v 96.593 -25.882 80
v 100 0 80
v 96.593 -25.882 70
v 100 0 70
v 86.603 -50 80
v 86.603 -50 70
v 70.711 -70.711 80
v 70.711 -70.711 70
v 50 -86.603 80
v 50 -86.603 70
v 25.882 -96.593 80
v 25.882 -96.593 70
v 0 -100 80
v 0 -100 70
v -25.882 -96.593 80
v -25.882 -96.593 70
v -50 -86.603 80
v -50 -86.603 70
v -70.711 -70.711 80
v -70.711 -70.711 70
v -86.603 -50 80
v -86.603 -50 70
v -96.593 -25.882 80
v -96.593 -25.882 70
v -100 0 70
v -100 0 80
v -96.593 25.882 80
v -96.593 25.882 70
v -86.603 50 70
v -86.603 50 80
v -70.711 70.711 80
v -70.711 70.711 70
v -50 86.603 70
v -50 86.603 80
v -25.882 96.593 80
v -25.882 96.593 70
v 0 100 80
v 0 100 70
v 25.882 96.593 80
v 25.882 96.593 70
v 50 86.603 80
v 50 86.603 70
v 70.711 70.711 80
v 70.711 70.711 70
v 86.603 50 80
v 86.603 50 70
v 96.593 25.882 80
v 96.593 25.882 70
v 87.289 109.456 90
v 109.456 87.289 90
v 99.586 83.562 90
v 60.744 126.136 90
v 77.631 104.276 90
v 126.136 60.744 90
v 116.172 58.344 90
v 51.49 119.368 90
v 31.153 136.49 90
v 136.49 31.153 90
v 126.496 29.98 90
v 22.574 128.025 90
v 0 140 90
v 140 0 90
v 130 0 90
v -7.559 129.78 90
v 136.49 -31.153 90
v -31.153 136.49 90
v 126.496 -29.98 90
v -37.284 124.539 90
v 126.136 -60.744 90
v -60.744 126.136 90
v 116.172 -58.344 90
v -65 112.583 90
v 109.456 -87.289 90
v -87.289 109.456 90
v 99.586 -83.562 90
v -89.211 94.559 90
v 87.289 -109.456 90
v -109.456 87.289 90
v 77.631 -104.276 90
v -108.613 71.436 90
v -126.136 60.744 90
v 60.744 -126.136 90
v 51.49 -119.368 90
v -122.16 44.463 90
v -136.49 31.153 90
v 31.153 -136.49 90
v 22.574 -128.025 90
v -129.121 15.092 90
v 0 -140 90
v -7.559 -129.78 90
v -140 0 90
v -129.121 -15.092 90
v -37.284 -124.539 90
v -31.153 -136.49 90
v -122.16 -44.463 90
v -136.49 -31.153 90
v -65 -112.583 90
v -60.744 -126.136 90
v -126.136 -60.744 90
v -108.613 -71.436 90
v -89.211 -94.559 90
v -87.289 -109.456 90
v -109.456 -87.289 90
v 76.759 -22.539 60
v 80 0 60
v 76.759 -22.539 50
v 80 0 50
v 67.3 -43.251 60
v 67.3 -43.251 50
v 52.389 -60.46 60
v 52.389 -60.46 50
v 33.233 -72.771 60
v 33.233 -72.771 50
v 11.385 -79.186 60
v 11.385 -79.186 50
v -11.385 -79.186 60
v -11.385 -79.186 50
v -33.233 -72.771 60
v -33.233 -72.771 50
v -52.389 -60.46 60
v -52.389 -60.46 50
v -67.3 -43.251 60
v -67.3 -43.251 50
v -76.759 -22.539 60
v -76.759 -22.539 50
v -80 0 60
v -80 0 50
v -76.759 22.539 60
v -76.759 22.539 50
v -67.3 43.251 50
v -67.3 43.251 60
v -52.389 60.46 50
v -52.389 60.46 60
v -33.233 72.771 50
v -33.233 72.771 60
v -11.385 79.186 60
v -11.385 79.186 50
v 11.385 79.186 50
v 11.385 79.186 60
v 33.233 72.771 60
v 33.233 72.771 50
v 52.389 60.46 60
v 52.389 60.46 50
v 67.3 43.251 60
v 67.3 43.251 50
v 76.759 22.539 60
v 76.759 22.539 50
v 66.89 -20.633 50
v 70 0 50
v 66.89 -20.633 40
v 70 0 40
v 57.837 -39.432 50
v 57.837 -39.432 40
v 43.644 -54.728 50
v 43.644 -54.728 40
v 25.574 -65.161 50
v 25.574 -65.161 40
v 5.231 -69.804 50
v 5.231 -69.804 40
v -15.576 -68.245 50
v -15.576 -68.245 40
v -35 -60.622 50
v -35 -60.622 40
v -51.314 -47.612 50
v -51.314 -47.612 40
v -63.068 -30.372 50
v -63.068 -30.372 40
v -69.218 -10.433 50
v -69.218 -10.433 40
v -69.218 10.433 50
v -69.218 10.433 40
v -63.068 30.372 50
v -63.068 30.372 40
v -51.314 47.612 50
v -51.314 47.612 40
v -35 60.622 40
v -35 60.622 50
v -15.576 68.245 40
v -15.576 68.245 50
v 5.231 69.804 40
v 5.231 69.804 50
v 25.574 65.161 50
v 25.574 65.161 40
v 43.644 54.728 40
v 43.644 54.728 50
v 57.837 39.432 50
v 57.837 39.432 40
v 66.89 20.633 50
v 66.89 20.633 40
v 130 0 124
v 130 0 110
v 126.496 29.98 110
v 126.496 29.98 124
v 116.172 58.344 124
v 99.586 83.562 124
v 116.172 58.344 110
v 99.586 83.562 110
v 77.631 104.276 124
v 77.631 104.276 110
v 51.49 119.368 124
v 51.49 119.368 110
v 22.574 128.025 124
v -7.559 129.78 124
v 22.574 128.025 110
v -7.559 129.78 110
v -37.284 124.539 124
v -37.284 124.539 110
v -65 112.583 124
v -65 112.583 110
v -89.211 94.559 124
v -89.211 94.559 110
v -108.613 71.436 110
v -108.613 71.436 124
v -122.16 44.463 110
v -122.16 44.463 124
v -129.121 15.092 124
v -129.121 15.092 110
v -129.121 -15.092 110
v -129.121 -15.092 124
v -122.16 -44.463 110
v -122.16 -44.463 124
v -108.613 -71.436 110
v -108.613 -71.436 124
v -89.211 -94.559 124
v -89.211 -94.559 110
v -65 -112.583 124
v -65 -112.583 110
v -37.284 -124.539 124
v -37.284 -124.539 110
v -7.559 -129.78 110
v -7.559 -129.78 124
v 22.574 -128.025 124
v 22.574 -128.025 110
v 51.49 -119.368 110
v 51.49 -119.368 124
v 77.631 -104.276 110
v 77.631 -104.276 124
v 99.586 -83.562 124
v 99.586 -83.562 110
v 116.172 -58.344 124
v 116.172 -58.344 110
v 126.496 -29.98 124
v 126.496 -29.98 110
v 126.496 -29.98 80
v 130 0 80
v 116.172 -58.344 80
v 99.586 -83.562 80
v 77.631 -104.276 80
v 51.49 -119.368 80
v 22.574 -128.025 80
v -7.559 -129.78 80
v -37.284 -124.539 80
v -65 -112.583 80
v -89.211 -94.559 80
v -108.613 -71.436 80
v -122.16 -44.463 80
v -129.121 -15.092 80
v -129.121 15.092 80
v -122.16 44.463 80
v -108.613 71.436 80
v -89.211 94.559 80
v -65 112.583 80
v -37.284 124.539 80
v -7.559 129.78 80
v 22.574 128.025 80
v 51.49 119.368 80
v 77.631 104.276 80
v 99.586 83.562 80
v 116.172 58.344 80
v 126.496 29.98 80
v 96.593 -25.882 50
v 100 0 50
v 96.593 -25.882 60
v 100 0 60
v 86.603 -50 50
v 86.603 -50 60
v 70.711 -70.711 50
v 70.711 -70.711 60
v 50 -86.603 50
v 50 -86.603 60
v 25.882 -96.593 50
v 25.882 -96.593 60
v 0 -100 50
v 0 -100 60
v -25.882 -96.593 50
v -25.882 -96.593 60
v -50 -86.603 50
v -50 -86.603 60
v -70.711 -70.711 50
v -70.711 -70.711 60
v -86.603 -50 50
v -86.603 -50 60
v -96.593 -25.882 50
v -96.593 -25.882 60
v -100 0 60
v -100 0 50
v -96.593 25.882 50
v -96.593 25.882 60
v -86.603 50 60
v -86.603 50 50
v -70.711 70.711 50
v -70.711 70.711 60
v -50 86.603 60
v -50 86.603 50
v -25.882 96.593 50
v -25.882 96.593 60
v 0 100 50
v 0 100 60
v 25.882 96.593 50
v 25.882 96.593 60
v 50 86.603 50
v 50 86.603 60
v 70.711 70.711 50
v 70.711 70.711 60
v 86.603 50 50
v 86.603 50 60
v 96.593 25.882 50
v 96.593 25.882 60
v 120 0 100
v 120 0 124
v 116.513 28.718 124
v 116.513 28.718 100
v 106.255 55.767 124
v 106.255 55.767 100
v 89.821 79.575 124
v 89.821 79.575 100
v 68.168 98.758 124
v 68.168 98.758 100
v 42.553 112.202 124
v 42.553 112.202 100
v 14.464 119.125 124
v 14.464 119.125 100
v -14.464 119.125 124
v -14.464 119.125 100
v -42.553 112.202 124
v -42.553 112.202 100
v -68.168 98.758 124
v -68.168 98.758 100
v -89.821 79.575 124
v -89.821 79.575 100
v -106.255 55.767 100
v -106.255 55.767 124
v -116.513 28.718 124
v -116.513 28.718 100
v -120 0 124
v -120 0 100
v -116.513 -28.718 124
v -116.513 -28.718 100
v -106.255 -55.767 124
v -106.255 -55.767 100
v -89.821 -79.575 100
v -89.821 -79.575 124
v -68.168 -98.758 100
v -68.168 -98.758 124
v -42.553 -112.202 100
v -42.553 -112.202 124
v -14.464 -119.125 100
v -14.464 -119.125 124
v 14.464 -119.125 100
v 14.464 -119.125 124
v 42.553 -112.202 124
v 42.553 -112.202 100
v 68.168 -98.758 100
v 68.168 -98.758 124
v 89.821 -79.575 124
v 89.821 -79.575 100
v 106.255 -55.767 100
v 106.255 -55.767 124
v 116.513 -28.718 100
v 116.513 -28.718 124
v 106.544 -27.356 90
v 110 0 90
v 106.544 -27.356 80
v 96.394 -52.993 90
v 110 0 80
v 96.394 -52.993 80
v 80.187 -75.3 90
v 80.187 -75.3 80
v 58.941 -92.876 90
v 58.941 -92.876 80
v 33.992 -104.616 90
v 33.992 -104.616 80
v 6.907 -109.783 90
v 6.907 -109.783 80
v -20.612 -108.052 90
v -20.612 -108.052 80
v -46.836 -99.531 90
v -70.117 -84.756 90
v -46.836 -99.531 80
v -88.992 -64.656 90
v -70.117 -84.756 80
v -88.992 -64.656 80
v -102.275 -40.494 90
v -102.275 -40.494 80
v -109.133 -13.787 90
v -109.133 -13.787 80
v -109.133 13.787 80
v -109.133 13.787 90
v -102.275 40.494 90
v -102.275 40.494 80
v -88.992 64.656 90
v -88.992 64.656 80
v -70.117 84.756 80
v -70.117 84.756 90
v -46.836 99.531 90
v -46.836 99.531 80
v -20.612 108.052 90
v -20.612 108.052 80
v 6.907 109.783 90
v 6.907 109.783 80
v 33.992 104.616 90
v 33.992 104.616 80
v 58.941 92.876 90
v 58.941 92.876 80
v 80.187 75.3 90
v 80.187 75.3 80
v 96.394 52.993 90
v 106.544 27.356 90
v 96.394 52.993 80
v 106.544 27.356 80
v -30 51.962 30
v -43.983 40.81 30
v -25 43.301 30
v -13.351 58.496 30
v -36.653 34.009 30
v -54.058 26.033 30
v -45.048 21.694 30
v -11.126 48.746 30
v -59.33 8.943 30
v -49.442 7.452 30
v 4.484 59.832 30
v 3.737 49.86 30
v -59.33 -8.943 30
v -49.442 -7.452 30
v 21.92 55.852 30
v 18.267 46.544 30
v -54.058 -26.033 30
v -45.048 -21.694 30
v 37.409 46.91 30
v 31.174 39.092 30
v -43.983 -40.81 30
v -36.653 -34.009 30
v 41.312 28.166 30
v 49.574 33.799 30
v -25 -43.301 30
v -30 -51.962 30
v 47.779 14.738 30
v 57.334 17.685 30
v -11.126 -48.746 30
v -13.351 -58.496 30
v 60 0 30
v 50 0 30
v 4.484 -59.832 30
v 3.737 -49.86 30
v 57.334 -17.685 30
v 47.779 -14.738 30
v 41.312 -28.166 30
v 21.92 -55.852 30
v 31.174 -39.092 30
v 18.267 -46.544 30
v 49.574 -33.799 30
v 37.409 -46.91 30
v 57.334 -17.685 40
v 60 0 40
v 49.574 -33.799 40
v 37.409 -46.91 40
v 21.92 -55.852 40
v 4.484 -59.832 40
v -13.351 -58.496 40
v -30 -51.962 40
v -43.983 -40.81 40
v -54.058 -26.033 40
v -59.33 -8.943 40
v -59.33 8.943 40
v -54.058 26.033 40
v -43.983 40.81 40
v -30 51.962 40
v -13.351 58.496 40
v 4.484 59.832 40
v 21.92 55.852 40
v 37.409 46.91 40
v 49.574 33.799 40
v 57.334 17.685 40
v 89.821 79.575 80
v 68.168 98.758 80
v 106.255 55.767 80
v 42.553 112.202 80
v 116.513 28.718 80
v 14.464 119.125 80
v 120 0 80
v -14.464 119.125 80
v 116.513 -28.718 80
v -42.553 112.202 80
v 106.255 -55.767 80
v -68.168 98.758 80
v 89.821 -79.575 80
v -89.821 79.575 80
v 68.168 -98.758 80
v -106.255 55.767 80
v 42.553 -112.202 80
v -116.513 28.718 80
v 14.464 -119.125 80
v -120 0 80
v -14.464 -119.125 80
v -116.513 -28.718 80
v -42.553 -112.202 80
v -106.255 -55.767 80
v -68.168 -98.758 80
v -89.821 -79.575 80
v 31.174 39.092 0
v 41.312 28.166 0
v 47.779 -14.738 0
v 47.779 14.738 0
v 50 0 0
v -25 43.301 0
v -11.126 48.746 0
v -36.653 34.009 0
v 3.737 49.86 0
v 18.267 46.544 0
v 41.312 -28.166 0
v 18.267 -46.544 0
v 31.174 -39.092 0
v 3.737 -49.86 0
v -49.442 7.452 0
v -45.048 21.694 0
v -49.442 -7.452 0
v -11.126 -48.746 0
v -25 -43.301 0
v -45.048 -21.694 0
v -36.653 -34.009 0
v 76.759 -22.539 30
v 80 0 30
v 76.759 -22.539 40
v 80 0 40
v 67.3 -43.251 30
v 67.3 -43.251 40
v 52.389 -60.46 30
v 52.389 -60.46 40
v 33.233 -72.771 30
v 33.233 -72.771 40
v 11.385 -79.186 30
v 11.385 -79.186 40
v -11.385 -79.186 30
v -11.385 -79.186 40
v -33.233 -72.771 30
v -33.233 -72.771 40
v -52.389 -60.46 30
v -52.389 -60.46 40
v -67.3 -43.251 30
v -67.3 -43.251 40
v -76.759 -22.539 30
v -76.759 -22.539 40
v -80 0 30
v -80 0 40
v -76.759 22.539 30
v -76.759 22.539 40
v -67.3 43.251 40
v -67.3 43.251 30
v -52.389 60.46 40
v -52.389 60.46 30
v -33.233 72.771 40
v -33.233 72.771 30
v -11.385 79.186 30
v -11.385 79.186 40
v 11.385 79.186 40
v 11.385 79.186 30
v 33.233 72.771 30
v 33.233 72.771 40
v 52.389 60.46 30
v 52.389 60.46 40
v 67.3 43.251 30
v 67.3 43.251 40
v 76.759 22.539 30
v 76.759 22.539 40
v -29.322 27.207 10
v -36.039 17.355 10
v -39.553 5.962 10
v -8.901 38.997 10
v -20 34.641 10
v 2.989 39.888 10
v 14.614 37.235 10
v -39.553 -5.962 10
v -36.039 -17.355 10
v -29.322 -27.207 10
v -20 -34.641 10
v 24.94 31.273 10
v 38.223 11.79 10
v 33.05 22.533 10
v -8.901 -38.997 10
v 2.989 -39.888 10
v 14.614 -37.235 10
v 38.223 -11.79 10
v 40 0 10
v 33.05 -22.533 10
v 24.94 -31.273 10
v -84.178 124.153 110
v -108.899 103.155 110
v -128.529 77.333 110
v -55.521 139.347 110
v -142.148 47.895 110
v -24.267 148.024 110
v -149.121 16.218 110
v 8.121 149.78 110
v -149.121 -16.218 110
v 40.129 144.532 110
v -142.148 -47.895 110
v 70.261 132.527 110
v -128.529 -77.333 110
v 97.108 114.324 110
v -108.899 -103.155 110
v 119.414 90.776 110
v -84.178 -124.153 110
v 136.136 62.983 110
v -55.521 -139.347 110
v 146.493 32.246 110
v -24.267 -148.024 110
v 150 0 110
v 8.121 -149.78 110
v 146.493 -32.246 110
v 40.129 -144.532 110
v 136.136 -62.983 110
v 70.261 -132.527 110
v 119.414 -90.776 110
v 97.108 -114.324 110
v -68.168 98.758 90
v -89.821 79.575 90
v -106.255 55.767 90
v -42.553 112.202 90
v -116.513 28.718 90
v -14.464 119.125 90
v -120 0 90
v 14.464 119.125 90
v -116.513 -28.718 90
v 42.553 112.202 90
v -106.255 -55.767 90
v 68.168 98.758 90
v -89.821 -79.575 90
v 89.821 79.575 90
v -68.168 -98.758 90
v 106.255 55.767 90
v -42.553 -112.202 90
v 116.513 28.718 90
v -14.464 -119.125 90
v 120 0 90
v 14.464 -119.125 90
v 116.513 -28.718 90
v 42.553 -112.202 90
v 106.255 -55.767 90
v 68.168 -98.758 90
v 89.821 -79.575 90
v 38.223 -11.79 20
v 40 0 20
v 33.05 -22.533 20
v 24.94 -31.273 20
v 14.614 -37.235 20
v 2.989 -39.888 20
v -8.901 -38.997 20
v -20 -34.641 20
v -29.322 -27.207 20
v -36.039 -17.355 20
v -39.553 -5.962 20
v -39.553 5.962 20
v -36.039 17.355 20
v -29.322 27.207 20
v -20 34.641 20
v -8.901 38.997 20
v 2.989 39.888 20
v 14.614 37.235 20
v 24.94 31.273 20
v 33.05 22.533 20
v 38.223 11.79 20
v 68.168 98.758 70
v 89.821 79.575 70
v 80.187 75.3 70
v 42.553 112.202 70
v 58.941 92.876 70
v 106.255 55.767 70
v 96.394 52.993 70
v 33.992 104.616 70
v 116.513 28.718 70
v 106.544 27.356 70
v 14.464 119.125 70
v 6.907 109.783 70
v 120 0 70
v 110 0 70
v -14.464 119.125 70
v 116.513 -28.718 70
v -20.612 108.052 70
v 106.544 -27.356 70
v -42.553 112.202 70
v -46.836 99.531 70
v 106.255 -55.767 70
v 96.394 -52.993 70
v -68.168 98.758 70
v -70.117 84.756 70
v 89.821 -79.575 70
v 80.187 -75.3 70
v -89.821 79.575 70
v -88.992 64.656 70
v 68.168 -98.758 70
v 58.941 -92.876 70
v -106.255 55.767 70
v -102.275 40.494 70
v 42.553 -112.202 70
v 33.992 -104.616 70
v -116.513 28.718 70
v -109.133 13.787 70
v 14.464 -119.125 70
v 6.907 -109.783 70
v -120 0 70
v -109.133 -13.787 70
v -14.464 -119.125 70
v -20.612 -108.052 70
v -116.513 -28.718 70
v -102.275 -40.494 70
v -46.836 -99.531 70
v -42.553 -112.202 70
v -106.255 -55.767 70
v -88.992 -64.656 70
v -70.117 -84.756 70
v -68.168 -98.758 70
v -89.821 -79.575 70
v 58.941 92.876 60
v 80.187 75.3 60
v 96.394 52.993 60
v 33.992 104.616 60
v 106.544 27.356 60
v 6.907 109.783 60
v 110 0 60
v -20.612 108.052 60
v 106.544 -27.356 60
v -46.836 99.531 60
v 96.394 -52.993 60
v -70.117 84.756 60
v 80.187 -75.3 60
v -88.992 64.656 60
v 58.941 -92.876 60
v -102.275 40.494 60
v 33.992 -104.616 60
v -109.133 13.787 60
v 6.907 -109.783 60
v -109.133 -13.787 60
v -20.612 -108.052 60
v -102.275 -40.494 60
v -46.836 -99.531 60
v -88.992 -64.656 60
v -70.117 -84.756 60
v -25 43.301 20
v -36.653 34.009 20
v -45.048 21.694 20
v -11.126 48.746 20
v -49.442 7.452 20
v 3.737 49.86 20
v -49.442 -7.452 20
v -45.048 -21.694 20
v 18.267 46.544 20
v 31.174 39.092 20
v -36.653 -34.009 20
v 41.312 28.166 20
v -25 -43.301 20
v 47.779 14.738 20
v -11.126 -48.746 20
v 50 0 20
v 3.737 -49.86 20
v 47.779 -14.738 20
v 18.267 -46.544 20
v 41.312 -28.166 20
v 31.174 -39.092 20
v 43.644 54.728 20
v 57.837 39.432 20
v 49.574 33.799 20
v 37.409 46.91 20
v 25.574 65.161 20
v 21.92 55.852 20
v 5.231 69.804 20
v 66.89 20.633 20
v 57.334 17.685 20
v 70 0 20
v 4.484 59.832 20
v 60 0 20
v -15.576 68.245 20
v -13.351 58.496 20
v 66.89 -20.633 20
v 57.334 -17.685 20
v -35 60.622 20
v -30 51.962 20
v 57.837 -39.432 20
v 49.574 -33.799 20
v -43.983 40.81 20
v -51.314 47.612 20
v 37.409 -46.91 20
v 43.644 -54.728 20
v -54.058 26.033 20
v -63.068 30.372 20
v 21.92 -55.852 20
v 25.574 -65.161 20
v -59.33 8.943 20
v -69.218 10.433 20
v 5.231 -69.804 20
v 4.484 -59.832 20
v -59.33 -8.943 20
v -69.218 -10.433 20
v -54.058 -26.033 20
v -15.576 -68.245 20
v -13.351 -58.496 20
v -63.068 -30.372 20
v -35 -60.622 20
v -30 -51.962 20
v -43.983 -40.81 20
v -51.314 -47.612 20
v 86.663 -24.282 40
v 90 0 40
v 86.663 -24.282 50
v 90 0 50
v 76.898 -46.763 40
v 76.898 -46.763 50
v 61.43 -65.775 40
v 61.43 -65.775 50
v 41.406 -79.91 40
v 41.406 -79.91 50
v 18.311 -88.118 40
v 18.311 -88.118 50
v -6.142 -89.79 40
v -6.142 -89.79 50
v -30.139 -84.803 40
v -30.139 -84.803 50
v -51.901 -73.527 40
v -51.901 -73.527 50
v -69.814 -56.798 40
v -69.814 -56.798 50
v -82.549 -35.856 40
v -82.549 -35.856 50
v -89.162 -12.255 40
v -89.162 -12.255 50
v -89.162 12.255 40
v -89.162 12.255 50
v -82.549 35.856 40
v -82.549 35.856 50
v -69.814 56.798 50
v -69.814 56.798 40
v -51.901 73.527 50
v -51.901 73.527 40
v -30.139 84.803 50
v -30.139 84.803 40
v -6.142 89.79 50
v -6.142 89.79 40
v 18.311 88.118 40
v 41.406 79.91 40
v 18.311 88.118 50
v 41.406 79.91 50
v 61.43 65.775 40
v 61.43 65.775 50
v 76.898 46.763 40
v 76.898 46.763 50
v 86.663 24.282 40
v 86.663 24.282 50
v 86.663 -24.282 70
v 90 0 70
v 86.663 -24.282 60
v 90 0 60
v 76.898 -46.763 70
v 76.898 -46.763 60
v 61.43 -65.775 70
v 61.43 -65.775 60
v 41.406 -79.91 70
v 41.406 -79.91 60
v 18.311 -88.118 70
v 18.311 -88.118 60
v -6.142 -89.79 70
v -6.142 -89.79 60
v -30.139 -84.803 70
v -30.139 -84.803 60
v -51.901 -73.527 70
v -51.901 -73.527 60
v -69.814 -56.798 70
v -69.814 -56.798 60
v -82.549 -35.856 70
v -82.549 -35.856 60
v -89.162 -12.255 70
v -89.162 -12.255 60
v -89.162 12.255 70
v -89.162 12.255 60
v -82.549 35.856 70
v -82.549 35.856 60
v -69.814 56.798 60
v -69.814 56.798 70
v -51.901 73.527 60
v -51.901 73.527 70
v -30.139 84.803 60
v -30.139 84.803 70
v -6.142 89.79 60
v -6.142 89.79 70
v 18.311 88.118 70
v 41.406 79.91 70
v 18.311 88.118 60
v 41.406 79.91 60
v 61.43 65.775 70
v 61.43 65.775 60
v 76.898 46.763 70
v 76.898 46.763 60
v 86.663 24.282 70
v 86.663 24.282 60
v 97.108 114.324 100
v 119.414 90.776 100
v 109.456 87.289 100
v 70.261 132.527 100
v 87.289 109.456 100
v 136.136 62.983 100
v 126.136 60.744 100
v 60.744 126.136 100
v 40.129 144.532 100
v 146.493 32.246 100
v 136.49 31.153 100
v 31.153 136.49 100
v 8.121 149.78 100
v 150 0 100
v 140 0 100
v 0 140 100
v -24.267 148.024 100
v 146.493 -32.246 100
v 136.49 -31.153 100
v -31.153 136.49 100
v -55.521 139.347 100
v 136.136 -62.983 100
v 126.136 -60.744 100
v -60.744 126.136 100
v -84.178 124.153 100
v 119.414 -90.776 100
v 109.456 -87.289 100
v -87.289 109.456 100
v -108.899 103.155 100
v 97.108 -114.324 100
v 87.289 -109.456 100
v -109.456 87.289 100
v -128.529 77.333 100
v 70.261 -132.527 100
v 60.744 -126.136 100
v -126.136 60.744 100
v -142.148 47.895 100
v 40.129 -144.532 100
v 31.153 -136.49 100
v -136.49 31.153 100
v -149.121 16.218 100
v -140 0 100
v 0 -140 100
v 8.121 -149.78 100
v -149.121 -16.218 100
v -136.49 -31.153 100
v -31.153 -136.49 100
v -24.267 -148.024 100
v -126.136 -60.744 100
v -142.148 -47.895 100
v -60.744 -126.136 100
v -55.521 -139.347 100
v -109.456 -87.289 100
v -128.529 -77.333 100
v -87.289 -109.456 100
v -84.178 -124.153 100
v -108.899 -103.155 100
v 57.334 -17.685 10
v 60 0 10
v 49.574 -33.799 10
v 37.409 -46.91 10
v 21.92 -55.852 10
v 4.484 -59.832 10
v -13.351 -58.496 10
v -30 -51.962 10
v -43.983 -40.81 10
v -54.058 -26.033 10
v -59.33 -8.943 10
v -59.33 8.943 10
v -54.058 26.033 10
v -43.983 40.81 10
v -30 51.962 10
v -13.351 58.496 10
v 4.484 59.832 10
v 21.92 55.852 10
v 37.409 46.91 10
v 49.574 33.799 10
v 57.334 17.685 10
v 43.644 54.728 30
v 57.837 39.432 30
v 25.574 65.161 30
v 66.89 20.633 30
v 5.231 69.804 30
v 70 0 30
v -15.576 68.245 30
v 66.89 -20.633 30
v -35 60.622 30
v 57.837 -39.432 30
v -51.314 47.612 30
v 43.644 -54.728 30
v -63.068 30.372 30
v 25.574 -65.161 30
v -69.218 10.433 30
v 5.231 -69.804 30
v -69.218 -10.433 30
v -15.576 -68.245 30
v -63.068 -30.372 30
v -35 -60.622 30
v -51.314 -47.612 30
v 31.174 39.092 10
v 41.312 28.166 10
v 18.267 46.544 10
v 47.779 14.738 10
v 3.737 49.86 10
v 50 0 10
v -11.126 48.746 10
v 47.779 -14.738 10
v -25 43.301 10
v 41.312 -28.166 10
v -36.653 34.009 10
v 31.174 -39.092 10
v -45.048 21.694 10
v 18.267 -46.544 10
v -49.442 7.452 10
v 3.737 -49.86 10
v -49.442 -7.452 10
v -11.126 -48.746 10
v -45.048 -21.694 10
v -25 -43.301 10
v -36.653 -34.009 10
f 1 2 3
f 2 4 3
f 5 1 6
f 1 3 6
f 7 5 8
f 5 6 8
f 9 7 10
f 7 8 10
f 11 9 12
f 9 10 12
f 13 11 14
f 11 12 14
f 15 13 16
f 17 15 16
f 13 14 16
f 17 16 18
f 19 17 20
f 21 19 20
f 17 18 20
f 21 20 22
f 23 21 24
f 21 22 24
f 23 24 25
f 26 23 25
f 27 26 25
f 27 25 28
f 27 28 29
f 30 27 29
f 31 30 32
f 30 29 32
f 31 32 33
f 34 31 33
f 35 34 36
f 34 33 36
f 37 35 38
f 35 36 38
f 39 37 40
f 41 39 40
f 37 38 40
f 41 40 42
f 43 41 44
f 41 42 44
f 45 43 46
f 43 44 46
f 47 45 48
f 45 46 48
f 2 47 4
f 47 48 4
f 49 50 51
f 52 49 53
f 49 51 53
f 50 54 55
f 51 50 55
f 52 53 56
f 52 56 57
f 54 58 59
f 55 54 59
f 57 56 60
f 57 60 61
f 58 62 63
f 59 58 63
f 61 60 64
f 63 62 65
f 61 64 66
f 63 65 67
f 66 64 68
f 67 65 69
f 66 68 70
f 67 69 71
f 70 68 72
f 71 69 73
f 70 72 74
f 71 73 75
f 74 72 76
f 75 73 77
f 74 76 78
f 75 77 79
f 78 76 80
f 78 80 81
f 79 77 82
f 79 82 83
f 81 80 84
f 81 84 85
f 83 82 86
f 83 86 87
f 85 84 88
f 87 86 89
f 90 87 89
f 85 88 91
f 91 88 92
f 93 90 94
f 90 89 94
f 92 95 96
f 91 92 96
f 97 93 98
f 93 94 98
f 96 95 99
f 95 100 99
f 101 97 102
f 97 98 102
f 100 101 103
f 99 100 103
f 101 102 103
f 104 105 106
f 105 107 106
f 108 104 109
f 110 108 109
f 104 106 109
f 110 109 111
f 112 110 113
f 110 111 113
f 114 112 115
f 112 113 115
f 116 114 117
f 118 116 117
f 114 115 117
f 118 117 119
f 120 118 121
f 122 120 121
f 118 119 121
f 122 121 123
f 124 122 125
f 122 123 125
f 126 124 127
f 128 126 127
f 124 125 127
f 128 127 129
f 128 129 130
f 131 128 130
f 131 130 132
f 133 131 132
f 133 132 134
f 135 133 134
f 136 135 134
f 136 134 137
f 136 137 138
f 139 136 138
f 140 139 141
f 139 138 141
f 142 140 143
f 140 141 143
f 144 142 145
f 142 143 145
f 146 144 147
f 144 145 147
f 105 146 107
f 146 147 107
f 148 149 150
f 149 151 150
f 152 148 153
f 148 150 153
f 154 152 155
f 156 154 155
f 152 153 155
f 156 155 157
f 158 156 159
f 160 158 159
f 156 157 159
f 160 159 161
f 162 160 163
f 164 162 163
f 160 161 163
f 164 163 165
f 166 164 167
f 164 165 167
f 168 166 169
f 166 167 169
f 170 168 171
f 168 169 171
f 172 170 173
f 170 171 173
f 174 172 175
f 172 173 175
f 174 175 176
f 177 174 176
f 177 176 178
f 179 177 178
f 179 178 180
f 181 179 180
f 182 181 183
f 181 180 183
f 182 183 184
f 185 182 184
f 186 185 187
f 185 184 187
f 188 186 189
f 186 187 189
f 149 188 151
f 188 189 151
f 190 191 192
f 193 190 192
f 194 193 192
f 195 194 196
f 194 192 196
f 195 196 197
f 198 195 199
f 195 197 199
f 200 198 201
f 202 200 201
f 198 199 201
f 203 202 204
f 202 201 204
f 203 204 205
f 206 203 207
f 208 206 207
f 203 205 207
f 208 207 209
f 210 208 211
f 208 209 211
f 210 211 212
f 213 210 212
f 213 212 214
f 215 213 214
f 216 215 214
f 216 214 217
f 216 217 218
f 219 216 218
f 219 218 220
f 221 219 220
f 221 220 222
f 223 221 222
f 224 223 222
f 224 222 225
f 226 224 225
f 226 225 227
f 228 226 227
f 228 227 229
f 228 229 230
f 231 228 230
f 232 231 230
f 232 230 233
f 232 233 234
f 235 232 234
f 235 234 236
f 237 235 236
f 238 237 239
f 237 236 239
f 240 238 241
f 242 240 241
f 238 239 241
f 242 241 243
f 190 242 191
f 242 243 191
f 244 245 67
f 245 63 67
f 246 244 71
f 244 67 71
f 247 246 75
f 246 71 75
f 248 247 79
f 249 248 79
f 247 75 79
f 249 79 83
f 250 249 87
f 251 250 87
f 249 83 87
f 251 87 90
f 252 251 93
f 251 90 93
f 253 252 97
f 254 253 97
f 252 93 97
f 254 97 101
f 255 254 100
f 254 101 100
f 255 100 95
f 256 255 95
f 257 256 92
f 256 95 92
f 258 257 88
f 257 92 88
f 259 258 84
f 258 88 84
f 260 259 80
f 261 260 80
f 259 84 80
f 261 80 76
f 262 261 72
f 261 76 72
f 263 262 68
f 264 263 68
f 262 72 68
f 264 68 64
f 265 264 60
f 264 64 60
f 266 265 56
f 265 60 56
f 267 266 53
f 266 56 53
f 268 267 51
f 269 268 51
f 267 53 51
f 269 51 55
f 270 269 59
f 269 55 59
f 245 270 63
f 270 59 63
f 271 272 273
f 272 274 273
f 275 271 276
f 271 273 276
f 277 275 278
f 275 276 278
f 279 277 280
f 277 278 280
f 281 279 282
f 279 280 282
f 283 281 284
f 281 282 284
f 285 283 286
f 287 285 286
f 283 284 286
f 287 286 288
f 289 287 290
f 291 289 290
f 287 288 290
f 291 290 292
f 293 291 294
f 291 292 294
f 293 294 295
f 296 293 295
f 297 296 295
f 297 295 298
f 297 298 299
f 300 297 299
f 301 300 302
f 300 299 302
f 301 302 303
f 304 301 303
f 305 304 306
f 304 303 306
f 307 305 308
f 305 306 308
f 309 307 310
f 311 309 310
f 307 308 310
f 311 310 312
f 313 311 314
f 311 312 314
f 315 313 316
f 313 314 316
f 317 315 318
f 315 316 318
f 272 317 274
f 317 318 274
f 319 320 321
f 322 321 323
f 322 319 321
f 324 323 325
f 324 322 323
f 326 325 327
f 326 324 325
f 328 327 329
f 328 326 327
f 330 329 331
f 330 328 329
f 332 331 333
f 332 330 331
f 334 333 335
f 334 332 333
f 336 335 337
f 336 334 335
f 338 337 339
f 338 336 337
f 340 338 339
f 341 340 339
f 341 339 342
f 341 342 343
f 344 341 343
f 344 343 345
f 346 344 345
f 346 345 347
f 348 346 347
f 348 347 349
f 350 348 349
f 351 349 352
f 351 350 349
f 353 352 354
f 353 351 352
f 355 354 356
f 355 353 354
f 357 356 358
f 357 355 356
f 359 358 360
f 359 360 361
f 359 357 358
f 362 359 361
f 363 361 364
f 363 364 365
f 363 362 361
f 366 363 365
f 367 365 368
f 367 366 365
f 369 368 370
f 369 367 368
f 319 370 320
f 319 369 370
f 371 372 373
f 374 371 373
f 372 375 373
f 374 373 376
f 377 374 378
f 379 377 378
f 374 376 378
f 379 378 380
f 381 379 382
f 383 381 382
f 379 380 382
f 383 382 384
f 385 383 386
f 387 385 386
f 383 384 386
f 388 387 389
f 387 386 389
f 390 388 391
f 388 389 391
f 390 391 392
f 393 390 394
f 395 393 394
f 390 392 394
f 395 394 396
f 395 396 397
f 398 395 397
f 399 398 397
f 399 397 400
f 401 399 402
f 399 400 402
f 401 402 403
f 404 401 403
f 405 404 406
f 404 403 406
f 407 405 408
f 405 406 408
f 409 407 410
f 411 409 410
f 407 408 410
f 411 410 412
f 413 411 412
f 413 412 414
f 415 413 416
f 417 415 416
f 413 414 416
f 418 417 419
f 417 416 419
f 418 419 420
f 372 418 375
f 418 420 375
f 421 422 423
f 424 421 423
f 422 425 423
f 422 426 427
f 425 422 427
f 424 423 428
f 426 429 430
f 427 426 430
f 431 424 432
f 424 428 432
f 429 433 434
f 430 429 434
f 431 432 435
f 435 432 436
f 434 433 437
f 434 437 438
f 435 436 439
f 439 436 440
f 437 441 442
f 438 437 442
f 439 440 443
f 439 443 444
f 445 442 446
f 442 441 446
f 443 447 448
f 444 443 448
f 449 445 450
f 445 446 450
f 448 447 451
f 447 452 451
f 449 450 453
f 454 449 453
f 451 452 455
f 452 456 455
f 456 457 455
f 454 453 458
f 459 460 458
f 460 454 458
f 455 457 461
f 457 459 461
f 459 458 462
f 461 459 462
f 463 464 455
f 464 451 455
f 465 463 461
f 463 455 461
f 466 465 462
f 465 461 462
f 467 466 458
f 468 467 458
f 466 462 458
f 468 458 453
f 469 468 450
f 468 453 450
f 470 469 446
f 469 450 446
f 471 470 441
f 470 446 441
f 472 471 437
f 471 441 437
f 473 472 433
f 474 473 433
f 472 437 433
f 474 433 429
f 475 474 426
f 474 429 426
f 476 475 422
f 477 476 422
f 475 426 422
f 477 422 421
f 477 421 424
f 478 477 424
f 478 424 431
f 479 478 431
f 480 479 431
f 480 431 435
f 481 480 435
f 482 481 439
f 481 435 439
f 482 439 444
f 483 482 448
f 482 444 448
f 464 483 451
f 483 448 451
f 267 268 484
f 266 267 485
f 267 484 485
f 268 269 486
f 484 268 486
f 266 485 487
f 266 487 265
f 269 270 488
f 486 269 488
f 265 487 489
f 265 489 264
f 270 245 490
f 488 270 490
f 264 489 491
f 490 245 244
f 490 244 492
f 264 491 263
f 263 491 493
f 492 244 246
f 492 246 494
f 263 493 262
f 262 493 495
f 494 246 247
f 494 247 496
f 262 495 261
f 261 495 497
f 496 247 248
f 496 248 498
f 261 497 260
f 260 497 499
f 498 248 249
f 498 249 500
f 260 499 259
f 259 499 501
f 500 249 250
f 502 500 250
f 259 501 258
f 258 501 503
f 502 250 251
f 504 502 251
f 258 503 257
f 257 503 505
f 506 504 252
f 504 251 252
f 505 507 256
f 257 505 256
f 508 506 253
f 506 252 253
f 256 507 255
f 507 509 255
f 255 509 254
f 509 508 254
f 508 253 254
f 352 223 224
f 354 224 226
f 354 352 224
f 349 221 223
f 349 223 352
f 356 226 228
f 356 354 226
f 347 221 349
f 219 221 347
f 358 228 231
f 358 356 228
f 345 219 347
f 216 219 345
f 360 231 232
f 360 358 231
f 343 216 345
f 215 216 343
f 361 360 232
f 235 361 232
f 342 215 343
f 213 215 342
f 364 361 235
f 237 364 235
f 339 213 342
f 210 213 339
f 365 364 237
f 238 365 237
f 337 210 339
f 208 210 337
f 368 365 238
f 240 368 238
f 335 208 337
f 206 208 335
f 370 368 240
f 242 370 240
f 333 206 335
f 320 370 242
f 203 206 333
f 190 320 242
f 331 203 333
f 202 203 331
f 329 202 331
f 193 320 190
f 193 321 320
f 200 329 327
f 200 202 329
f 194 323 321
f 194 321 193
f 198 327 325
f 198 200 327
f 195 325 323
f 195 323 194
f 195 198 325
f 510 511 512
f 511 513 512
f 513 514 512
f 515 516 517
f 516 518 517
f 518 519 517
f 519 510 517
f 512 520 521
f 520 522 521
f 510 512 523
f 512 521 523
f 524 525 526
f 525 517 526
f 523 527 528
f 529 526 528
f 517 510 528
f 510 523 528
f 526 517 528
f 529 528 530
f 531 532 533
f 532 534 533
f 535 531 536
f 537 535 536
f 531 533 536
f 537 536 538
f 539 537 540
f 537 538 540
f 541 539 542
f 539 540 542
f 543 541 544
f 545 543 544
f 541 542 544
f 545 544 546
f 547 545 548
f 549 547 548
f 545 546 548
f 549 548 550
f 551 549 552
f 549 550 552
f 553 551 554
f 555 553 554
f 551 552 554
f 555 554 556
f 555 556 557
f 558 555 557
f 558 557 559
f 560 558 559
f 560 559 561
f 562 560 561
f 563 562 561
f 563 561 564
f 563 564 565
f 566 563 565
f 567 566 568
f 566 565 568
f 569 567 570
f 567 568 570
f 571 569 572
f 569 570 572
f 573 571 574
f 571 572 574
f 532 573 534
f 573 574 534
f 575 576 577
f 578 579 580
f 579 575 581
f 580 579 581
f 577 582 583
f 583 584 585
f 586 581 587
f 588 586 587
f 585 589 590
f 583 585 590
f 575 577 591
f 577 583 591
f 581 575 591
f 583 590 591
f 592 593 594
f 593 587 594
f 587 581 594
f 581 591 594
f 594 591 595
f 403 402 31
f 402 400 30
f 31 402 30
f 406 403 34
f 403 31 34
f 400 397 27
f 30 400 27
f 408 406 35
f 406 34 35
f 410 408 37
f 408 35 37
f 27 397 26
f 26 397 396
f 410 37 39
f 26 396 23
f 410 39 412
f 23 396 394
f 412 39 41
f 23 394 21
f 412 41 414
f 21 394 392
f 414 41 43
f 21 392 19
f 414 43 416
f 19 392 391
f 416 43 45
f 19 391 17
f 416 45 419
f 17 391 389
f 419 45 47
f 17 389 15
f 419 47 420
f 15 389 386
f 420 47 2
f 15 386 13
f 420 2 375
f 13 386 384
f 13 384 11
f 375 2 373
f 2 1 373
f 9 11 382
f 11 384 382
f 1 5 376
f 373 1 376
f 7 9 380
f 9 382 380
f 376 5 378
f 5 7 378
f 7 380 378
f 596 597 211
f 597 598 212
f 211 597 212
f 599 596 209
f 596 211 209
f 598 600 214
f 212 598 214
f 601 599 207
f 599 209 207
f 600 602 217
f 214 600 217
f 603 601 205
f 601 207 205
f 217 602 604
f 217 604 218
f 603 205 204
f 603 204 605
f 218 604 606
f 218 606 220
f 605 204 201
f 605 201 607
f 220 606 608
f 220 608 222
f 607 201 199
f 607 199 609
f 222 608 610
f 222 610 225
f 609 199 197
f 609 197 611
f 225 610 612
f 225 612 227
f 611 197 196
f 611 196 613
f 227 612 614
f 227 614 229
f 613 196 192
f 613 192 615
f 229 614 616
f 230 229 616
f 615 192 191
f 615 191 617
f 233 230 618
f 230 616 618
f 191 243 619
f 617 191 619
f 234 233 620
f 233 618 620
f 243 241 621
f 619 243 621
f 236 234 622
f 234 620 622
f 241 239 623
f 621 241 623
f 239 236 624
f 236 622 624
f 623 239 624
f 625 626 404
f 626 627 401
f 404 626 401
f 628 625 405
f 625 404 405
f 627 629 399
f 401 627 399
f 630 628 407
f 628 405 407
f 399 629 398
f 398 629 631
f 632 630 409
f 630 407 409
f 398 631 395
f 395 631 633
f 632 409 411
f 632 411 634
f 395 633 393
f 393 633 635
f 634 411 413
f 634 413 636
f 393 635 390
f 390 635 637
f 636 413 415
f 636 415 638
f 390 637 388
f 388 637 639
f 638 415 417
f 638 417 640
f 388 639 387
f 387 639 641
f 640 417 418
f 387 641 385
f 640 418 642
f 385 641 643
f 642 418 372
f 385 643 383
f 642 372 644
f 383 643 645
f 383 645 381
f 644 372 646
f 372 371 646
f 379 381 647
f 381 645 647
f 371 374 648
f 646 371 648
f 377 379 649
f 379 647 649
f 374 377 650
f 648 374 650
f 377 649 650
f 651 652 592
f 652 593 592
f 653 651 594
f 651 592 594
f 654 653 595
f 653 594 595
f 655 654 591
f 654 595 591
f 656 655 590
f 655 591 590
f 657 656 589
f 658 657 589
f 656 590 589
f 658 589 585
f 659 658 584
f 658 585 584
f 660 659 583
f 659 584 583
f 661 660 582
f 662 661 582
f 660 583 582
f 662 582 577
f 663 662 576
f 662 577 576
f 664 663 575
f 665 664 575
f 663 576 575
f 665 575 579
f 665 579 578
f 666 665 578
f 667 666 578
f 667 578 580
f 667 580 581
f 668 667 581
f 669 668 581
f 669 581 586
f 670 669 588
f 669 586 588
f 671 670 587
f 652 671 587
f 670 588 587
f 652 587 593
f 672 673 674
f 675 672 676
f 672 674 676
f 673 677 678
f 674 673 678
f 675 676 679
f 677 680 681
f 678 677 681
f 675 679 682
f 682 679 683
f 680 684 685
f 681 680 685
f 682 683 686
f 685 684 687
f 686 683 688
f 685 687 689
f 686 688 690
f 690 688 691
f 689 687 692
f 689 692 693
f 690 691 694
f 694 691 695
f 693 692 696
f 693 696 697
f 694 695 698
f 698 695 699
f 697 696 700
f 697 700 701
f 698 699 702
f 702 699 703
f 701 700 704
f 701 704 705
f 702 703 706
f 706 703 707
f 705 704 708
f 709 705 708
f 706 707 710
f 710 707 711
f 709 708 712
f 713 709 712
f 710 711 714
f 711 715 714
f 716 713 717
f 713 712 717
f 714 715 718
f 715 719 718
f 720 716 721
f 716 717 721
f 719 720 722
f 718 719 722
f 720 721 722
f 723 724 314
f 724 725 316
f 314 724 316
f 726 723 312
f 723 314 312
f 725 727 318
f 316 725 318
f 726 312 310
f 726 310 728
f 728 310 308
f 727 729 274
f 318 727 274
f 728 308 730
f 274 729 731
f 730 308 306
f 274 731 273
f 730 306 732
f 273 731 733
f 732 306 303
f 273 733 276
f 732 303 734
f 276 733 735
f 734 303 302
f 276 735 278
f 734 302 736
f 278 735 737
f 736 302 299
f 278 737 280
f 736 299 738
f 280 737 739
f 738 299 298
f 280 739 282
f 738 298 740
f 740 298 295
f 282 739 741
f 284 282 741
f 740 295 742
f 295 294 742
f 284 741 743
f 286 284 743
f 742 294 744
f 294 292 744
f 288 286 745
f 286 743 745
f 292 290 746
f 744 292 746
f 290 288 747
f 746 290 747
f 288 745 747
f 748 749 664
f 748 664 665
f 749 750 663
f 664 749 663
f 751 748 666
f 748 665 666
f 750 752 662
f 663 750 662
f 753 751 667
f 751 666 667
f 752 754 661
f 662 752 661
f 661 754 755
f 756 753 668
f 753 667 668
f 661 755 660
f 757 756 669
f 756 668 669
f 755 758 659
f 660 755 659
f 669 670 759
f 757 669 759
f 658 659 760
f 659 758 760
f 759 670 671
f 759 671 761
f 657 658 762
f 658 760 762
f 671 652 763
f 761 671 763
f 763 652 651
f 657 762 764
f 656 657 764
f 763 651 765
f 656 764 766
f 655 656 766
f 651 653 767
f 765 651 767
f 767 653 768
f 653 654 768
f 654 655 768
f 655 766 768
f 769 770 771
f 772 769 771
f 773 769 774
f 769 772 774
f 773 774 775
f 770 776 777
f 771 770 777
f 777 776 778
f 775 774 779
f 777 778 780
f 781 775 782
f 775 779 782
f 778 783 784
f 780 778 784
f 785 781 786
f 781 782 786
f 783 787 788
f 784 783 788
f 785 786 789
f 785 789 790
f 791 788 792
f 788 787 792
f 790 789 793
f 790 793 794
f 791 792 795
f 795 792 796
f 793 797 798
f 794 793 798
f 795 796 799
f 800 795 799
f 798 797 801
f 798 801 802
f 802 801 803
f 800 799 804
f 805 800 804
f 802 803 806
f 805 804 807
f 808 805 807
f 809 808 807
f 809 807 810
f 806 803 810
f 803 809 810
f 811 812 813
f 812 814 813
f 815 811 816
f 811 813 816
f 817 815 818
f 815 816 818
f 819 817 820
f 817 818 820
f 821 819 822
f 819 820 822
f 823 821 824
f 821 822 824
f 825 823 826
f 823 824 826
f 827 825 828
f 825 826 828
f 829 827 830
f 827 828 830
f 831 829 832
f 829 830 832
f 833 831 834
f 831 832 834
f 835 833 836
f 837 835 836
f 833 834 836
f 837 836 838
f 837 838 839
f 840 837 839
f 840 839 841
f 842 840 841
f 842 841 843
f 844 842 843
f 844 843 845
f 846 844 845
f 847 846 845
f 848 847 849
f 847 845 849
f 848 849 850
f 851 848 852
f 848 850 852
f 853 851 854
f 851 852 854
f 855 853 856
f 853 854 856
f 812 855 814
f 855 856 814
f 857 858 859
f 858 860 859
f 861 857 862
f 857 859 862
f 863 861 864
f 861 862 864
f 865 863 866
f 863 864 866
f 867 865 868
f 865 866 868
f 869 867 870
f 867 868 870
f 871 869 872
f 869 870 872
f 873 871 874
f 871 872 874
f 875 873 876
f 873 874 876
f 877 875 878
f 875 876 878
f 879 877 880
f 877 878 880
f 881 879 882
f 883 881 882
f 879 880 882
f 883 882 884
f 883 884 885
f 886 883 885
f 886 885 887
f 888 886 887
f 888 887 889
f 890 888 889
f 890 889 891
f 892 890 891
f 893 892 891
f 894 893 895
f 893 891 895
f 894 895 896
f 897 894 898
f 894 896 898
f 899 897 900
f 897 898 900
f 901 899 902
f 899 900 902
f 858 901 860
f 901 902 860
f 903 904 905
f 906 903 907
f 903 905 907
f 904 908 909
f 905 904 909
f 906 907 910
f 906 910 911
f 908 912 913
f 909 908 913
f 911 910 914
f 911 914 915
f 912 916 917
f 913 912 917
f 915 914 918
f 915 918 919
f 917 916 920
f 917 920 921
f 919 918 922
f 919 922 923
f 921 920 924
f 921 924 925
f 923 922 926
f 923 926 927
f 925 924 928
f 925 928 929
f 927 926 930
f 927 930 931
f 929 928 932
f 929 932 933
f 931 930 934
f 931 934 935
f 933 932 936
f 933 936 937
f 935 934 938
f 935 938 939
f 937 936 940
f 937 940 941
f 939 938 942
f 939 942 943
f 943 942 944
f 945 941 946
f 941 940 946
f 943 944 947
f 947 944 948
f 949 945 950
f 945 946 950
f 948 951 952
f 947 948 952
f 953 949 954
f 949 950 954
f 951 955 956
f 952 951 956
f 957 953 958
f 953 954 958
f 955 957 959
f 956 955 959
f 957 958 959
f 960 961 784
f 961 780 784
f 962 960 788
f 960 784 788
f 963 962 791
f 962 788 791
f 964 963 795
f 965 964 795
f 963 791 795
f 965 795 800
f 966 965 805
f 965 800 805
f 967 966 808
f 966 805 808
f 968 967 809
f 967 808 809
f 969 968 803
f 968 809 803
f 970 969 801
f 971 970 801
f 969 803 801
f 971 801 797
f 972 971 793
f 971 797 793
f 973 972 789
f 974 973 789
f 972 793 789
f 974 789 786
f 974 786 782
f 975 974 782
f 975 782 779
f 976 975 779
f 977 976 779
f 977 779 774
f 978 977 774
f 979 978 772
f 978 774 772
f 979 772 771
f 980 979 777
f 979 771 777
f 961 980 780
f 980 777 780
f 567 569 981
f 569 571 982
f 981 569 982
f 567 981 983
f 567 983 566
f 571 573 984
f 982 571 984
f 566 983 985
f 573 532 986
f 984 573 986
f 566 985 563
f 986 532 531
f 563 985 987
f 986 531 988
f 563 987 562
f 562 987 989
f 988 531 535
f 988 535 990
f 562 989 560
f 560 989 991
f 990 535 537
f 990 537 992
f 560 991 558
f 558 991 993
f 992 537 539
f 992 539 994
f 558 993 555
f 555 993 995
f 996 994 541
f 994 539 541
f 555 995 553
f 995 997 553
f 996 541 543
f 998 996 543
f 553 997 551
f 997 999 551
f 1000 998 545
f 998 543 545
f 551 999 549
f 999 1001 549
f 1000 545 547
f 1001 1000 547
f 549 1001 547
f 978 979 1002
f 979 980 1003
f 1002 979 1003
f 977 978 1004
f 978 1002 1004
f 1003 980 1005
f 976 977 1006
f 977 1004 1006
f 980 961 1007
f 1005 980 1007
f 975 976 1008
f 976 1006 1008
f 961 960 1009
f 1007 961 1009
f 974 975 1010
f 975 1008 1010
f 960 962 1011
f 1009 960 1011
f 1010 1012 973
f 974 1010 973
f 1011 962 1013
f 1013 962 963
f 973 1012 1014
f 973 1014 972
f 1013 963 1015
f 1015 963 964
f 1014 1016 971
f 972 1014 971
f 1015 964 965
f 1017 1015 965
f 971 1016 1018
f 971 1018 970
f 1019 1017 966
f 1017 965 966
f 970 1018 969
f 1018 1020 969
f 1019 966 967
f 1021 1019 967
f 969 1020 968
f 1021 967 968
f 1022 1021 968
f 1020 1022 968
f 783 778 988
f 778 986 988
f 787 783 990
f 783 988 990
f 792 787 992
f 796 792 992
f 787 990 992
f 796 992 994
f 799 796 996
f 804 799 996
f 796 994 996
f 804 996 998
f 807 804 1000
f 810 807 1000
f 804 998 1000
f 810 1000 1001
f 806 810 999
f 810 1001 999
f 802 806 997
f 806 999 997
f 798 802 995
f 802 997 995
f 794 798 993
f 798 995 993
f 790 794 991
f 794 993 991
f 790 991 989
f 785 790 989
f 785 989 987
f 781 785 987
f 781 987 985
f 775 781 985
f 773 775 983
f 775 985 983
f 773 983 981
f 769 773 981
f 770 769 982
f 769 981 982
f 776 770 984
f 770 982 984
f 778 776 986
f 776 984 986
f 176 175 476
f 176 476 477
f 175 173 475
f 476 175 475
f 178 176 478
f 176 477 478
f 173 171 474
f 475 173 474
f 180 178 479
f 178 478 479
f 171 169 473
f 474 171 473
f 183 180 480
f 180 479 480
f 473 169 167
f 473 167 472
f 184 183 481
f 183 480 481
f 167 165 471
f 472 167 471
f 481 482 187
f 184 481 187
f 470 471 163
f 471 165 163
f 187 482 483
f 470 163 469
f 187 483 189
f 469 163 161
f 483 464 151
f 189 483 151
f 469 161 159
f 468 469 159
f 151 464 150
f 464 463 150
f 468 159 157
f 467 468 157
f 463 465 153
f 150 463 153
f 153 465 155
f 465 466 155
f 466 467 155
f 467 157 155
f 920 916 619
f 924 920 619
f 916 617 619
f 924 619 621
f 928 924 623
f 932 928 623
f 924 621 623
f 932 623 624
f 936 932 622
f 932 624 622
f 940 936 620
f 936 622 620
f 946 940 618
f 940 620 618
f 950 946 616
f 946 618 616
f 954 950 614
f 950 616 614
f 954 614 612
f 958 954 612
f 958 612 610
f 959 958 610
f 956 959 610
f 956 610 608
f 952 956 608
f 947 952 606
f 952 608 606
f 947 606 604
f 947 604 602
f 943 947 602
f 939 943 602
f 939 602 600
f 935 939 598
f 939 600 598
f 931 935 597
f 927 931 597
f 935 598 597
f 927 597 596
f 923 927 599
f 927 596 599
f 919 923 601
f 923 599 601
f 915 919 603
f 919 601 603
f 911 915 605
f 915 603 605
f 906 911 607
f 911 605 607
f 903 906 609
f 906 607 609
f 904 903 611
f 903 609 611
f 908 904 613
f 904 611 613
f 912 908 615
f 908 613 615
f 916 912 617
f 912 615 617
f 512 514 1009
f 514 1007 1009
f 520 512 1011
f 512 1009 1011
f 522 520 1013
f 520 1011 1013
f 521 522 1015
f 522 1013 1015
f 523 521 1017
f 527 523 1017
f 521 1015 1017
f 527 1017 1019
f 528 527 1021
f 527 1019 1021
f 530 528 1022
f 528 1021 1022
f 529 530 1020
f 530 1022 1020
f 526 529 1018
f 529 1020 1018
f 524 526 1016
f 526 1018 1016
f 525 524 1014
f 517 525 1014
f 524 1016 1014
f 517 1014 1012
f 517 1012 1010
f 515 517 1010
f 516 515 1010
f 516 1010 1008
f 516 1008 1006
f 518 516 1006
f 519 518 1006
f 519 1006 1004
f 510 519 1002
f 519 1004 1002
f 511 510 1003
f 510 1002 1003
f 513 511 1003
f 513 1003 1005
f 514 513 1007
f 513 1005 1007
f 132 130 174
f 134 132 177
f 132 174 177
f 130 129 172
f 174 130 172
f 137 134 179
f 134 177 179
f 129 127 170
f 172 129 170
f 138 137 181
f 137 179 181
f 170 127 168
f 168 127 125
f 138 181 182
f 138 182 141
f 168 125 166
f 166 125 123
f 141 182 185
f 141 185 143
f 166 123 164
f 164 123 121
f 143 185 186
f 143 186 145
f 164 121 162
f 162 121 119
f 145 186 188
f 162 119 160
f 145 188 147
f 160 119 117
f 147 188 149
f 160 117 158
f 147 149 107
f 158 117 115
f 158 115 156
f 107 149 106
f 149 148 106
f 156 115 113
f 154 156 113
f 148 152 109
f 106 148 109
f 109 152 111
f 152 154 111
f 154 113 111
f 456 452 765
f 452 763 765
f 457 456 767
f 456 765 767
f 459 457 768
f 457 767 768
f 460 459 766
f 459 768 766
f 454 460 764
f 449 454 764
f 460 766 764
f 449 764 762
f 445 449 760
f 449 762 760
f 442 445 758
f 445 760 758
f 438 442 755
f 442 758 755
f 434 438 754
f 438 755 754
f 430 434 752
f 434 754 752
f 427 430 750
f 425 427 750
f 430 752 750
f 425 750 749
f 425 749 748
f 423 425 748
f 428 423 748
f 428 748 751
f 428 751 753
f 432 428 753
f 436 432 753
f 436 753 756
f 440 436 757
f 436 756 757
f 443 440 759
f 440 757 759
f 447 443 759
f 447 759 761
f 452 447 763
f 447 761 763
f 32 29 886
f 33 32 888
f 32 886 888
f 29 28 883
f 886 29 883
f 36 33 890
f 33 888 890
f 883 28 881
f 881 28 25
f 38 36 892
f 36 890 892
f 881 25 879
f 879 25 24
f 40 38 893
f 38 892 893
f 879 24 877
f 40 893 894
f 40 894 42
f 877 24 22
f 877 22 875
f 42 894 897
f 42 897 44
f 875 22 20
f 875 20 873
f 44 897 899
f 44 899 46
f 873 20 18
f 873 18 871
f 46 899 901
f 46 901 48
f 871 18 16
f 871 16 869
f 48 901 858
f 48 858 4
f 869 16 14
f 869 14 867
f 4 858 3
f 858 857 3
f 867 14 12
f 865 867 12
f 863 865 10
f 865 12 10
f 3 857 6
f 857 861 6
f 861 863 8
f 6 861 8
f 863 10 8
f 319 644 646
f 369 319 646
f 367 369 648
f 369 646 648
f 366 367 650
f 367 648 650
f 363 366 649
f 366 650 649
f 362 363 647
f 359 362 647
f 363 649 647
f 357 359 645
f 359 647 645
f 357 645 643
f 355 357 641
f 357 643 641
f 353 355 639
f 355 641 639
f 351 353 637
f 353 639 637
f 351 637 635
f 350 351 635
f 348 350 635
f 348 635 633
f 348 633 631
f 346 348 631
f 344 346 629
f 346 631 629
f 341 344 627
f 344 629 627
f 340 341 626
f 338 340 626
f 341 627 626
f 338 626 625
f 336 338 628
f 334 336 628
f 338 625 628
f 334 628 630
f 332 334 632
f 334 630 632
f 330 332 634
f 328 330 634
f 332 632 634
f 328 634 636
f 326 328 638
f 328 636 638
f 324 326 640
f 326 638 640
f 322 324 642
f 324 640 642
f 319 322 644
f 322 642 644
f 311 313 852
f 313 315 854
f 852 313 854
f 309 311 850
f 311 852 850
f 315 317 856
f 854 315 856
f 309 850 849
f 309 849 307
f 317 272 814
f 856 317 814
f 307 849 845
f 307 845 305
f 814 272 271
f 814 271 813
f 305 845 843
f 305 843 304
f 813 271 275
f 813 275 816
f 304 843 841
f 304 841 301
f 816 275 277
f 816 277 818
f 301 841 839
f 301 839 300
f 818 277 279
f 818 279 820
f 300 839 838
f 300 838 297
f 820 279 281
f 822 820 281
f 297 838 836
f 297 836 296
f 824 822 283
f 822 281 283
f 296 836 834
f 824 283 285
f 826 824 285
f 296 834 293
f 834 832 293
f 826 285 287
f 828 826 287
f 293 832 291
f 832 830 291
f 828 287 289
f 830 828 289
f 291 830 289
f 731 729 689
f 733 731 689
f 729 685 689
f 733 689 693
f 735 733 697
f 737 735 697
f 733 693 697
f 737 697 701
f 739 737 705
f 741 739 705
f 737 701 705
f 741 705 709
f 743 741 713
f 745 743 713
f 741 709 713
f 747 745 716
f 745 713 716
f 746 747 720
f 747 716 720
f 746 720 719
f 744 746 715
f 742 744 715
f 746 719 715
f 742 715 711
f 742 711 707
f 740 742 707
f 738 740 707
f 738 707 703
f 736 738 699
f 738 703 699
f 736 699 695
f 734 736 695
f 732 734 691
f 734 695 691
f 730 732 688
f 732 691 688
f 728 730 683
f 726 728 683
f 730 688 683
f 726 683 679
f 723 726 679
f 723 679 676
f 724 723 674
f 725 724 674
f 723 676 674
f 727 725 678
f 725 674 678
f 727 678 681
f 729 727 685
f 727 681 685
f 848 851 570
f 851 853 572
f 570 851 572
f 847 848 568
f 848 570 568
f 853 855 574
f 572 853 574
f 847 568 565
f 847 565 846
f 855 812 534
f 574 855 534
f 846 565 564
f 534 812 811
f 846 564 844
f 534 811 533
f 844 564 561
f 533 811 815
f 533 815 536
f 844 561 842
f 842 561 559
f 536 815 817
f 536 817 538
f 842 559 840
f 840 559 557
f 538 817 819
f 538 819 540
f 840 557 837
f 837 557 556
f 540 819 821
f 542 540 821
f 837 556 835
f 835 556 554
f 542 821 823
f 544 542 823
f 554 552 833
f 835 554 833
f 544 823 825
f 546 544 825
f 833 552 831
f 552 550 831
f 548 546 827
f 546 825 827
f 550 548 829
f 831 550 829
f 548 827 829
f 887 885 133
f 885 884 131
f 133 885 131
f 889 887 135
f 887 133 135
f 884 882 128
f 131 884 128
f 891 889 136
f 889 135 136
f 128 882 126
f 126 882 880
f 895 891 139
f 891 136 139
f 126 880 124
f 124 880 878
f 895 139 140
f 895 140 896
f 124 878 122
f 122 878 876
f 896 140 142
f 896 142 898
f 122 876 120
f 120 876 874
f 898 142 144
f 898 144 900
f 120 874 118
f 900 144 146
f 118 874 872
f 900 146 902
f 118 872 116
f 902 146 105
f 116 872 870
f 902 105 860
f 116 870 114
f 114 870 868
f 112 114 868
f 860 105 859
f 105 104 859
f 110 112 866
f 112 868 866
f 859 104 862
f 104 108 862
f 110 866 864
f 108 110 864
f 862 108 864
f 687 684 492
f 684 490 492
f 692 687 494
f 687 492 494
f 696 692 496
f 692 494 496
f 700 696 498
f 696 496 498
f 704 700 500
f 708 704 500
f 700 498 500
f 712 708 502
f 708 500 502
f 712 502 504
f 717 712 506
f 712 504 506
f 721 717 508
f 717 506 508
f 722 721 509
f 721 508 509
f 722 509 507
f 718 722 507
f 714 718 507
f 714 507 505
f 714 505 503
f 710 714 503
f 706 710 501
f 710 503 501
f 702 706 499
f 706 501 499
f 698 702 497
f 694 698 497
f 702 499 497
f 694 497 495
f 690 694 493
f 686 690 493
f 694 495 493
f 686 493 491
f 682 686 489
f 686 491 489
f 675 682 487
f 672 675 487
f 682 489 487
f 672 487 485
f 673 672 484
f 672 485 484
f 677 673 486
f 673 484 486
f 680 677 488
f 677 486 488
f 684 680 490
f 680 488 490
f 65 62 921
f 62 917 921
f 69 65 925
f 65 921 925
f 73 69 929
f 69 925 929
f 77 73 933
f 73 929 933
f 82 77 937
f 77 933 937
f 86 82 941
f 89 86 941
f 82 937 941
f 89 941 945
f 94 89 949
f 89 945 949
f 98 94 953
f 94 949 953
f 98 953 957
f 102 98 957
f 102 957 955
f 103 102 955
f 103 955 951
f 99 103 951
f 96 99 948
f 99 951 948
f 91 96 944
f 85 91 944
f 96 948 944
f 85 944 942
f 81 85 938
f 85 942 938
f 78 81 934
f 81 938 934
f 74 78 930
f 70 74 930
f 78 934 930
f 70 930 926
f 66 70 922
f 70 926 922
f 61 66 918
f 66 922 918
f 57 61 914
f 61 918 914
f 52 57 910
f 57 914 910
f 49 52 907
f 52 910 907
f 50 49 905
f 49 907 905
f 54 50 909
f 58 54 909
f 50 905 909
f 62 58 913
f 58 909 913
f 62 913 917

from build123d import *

# Parameters (mm, degrees)
F2_R     = 130
F2_R_2   = 120
F3_DEPTH = 24


with BuildPart() as f1:
    # F0 (on Front) → F1 (revolve)
    with BuildSketch(Plane.XZ):
        Polygon((0, 10), (0, 0), (50, 0), (50, 10), (60, 10), (60, 20), (70, 20), (70, 30), (80, 30), (80, 40), (90, 40), (90, 50), (100, 50), (100, 60), (110, 60), (110, 70), (120, 70), (120, 80), (130, 80), (130, 90), (140, 90), (140, 100), (150, 100), (150, 110), (130, 110), (130, 100), (120, 100), (120, 90), (110, 90), (110, 80), (100, 80), (100, 70), (90, 70), (90, 60), (80, 60), (80, 50), (70, 50), (70, 40), (60, 40), (60, 30), (50, 30), (50, 20), (40, 20), (40, 10), align=None)
    revolve(axis=Axis((0, 0, 5), (0, 0, -1)))

    # F2 (on face) → F3 (join)
    with BuildSketch(Plane.XY.offset(100)):
        Circle(F2_R)
        Circle(F2_R_2, mode=Mode.SUBTRACT)
    extrude(amount=F3_DEPTH)


solid = f1.part
